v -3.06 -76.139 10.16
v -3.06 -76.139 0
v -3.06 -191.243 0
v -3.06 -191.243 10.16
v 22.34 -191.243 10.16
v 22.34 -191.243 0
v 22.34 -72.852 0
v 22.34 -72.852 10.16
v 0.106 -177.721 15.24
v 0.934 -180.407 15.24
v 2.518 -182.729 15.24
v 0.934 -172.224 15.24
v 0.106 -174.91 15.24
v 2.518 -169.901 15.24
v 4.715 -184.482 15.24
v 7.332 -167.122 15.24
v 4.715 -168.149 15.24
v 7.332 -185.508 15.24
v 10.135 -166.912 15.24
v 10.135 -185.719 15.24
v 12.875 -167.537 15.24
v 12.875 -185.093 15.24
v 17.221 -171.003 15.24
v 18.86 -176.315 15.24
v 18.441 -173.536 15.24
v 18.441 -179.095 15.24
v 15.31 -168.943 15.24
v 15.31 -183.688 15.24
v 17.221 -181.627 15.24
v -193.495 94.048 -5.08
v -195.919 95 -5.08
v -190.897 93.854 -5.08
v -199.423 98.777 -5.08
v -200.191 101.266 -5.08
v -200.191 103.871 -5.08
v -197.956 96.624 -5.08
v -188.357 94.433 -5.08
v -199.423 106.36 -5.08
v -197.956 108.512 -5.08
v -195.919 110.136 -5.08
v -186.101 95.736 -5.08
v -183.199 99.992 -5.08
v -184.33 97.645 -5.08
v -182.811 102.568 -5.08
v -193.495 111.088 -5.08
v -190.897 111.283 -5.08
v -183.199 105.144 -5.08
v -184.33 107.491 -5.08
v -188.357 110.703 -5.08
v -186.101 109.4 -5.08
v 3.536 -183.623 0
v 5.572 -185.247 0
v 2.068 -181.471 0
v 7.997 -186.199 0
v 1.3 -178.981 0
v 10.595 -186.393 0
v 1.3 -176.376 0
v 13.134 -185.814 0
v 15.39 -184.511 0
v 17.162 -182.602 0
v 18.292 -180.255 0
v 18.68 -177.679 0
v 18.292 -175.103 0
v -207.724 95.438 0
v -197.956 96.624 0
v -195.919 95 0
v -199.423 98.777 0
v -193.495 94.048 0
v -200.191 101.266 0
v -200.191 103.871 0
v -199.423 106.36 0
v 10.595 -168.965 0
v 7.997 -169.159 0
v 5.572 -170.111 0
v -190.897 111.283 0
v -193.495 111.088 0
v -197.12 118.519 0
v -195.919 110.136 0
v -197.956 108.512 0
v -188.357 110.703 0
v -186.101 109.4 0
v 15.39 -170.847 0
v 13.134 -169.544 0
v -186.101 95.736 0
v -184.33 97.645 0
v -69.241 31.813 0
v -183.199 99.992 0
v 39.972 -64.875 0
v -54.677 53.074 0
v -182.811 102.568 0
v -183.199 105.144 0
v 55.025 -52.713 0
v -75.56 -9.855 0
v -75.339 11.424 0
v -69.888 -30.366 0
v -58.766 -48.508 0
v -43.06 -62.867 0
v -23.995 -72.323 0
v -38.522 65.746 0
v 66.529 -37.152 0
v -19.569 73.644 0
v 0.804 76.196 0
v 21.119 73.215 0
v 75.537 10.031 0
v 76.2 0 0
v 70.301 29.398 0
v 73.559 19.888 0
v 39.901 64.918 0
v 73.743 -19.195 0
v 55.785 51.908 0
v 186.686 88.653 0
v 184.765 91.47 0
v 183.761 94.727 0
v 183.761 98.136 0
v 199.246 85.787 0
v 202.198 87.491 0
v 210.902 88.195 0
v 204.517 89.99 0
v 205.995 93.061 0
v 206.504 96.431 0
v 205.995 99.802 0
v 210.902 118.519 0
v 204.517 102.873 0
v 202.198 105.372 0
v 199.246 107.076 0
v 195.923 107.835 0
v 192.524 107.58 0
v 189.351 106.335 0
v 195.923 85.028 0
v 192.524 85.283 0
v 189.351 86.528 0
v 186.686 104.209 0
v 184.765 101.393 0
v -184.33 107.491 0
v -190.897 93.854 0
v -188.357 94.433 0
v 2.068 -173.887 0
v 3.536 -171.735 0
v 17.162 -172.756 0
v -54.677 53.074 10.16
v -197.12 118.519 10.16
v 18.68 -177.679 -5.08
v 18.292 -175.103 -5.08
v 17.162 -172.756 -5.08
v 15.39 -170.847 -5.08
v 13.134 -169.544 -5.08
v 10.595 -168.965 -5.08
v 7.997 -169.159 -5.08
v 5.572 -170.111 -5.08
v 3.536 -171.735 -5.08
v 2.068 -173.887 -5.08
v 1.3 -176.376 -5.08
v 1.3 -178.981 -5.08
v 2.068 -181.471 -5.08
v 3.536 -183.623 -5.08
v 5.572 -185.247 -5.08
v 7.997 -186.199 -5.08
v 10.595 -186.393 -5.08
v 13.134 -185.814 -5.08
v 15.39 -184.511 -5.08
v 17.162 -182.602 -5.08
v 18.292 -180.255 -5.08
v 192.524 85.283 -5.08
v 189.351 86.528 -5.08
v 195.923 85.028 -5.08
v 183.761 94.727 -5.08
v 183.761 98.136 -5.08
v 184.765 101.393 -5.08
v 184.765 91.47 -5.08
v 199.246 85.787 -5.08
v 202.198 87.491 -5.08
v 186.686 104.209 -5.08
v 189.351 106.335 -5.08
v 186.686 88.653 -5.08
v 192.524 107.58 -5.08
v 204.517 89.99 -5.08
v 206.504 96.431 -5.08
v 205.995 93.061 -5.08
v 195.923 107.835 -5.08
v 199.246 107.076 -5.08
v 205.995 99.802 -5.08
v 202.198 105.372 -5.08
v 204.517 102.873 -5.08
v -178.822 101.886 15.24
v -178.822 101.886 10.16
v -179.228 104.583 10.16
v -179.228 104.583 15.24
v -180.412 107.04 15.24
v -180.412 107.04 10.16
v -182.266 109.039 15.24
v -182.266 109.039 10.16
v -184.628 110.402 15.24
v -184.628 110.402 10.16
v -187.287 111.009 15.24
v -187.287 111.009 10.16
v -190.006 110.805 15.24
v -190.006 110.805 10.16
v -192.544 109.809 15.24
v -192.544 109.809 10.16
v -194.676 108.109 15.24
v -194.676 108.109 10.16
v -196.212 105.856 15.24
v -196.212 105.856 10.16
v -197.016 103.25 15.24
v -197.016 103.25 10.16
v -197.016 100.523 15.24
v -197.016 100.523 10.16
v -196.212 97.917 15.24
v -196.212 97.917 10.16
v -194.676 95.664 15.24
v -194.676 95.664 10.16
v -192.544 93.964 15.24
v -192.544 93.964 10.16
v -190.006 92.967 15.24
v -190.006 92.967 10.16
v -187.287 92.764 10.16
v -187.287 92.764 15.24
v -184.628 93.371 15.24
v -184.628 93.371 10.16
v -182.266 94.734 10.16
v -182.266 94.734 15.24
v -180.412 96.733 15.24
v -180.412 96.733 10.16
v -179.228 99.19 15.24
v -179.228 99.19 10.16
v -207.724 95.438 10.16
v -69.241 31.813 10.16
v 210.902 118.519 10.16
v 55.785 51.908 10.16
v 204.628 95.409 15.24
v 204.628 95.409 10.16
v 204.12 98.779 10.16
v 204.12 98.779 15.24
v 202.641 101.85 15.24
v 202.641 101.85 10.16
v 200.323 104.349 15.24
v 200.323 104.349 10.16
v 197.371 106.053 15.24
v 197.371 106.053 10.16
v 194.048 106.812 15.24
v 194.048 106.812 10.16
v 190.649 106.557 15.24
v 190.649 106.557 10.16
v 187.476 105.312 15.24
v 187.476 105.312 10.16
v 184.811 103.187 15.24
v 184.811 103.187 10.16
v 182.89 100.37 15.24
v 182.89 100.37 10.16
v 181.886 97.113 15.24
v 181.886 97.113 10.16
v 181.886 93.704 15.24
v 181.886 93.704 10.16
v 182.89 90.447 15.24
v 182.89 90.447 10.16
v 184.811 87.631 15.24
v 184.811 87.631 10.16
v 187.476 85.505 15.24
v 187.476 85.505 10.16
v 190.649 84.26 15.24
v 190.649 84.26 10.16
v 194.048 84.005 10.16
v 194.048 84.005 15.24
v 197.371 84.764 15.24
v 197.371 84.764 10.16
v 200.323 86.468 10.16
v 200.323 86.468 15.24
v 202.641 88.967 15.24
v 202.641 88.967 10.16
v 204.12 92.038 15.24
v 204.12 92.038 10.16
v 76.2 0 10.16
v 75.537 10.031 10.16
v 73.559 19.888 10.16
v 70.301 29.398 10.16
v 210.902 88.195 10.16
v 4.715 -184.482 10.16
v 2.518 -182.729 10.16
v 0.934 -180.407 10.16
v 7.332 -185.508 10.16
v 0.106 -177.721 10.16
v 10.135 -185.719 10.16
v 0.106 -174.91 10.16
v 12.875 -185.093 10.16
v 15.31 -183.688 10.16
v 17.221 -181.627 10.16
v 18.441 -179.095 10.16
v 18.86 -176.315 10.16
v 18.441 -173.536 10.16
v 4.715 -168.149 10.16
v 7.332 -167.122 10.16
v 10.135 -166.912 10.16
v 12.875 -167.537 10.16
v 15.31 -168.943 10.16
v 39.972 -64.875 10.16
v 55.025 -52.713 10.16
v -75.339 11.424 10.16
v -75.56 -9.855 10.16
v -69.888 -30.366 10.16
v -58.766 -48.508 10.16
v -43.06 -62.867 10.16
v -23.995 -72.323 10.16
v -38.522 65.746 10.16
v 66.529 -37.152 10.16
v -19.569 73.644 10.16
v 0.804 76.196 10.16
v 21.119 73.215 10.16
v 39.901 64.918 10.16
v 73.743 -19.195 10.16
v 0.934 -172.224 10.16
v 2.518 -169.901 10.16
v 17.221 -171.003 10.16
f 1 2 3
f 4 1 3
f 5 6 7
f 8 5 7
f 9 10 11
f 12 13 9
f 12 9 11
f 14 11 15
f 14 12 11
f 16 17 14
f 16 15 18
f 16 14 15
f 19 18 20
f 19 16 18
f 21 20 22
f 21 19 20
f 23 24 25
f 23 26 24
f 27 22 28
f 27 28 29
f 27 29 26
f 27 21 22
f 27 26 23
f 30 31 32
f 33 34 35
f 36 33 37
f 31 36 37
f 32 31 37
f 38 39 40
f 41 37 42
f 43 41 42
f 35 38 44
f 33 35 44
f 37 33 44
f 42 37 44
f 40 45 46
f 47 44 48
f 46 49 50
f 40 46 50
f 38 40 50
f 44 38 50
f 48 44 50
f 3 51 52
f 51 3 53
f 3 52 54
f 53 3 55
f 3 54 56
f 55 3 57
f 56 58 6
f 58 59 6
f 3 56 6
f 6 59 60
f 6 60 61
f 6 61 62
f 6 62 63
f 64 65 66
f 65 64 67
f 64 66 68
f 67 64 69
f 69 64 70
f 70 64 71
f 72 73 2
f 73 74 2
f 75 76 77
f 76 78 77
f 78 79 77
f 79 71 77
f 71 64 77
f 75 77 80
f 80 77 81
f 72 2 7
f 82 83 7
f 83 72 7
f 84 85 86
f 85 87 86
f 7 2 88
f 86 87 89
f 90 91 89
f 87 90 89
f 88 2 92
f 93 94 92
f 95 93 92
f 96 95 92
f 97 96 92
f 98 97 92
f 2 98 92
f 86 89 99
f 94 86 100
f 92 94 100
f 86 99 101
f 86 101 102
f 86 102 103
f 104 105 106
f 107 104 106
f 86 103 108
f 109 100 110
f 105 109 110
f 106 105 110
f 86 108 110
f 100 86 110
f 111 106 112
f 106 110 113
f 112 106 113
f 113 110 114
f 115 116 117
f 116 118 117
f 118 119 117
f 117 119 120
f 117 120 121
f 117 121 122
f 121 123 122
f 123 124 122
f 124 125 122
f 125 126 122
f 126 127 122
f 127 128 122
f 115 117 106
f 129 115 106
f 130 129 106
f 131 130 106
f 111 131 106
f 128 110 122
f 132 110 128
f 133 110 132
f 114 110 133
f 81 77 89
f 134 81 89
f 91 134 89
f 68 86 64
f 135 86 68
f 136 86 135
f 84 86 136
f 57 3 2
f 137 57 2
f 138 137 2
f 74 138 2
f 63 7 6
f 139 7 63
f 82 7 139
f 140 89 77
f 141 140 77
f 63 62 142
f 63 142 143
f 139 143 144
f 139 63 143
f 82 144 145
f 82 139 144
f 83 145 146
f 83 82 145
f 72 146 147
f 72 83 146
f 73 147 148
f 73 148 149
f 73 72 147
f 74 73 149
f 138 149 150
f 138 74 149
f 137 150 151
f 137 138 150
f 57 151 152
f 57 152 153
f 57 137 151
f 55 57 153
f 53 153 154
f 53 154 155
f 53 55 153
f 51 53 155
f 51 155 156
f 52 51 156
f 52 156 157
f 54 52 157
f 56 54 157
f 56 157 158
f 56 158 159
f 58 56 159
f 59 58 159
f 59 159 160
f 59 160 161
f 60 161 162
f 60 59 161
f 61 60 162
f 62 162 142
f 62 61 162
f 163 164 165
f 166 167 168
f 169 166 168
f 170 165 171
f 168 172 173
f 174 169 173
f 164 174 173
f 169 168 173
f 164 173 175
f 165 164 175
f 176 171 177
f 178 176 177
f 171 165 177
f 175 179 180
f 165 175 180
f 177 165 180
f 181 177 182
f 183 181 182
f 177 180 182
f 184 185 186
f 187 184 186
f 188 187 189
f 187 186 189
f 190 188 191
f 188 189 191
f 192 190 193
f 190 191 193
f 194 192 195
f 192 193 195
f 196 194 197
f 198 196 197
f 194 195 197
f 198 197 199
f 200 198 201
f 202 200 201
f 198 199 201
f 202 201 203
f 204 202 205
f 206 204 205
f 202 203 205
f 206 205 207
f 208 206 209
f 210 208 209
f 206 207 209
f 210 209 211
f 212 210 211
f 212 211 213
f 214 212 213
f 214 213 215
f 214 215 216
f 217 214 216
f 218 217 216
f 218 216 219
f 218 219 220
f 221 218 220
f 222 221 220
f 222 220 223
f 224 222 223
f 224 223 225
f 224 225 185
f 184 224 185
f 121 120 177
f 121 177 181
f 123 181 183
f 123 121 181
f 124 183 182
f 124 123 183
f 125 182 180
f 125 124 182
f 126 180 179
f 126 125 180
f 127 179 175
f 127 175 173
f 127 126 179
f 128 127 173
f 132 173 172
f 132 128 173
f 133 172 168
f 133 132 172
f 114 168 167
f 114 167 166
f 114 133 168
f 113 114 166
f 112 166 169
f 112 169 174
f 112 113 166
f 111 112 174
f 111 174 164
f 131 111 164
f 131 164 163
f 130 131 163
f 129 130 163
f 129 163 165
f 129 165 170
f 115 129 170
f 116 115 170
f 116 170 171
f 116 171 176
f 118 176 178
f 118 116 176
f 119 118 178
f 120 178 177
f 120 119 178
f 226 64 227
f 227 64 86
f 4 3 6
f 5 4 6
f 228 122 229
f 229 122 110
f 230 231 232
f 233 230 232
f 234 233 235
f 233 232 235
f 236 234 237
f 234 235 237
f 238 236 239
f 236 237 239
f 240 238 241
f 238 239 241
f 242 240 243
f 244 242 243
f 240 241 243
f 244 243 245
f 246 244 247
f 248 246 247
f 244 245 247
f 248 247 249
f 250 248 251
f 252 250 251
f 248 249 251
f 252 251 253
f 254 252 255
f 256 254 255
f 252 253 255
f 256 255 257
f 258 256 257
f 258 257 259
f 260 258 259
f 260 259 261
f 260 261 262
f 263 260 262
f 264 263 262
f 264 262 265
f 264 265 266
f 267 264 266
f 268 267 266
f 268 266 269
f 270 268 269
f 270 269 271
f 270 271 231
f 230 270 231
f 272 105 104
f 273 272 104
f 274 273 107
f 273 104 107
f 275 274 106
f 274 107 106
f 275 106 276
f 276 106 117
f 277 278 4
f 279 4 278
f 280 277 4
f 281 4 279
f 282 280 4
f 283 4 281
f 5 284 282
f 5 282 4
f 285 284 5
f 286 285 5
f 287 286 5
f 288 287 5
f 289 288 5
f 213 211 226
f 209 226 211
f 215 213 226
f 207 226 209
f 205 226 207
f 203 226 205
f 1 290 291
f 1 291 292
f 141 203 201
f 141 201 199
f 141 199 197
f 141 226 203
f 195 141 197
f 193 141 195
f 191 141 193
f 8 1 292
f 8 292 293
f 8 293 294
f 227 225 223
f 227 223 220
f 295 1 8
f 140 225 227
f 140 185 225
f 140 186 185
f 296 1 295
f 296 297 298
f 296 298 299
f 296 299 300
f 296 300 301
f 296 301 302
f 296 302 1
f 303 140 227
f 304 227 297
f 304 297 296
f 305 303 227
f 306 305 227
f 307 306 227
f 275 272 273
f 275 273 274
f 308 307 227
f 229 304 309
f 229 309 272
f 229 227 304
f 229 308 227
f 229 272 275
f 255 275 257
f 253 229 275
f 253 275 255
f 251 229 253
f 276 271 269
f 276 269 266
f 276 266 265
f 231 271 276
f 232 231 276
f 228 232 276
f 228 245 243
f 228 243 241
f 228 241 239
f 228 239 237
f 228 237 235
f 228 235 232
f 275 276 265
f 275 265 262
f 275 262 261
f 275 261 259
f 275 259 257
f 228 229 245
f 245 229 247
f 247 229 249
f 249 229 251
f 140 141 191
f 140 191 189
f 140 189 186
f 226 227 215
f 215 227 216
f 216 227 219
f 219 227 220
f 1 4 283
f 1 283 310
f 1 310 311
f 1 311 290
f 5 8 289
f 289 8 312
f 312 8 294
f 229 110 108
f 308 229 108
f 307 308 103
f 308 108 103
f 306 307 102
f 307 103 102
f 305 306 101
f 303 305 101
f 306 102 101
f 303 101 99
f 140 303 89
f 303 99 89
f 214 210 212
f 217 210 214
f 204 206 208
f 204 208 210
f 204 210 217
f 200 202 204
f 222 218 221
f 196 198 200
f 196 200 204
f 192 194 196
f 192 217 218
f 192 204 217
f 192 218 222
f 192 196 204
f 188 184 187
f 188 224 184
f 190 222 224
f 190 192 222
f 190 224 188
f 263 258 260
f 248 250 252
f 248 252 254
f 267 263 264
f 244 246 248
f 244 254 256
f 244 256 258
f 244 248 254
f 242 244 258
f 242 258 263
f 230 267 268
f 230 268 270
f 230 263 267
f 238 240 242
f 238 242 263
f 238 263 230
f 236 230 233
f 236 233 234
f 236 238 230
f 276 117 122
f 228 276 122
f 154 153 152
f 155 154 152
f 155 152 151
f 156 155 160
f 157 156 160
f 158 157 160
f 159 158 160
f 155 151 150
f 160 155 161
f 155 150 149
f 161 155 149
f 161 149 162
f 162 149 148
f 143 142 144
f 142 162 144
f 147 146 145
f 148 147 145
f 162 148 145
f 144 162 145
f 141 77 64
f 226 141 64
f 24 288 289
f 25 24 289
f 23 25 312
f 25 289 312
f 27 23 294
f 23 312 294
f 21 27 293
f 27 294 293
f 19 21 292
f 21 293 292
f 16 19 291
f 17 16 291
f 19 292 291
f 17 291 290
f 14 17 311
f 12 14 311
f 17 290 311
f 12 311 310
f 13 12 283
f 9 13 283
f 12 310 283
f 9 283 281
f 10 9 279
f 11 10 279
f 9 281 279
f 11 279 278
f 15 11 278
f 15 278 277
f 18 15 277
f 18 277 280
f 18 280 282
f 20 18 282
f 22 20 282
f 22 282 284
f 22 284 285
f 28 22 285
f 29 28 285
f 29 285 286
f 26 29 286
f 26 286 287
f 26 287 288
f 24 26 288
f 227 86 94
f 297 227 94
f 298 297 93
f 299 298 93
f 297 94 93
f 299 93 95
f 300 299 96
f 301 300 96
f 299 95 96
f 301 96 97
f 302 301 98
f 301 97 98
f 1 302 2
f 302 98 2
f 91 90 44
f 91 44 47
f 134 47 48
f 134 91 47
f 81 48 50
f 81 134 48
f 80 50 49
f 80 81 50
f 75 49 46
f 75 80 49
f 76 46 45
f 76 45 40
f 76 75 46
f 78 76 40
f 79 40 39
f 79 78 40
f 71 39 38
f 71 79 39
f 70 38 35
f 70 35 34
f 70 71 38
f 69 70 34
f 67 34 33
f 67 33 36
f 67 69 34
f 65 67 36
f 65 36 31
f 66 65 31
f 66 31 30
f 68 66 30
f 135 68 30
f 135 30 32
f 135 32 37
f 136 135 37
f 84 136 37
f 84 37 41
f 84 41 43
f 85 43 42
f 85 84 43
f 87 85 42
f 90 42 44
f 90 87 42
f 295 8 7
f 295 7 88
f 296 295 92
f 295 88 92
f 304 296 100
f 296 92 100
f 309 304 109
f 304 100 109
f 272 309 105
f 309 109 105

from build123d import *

# Parameters (mm, degrees)
F2_DEPTH = 10.16
F1_R     = 9.1481918334
F1_R_2   = 9.4297469702
F1_R_3   = 11.4352472888
F3_DEPTH = 15.24
F4_R     = 8.7387989597
F4_R_2   = 8.7387973247
F4_R_3   = 11.4352472888
F5_DEPTH = 5.08


with BuildPart() as f2:
    # F0 (on Top) → F2 (new body)
    with BuildSketch(Plane.XY):
        with BuildLine():
            ThreePointArc((22.3403535783, -72.851551816), (61.2730566508, -45.2995864072), (76.2, 0))
            ThreePointArc((76.2, 0), (74.7105977036, 14.9922176738), (70.3006144153, 29.3983607168))
            Line((70.3006144153, 29.3983607168), (22.3403535783, 9.3423048788))
            Line((22.3403535783, 9.3423048788), (22.3403535783, -72.851551816))
        make_face()
        with BuildLine():
            Line((22.3403535783, 9.3423048788), (70.3006144153, 29.3983607168))
            ThreePointArc((70.3006144153, 29.3983607168), (64.0396717964, 41.2960099309), (55.785185421, 51.9081215952))
            Line((55.785185421, 51.9081215952), (21.8996389933, 37.3568432093))
            Line((21.8996389933, 37.3568432093), (22.3403535783, 37.3568432093))
            Line((22.3403535783, 37.3568432093), (22.3403535783, 9.3423048788))
        make_face()
        with BuildLine():
            ThreePointArc((55.785185421, 51.9081215952), (64.0396717964, 41.2960099309), (70.3006144153, 29.3983607168))
            Line((70.3006144153, 29.3983607168), (210.9018432458, 88.1950821504))
            Line((210.9018432458, 88.1950821504), (210.9018432458, 118.5189898936))
            Line((210.9018432458, 118.5189898936), (55.785185421, 51.9081215952))
        make_face()
        with BuildLine():
            Line((22.3403535783, -191.2431567907), (22.3403535783, -72.851551816))
            ThreePointArc((22.3403535783, -72.851551816), (9.7794429224, -75.5698517673), (-3.0596464217, -76.1385484743))
            Line((-3.0596464217, -76.1385484743), (-3.0596464217, -191.2431567907))
            Line((-3.0596464217, -191.2431567907), (22.3403535783, -191.2431567907))
        make_face()
        with BuildLine():
            ThreePointArc((-3.0596464217, -76.1385484743), (9.7794429224, -75.5698517673), (22.3403535783, -72.851551816))
            Line((22.3403535783, -72.851551816), (22.3403535783, 9.3423048788))
            Line((22.3403535783, 9.3423048788), (0, 0))
            Line((0, 0), (-3.0596464217, 1.4057470004))
            Line((-3.0596464217, 1.4057470004), (-3.0596464217, -76.1385484743))
        make_face()
        with BuildLine():
            Line((21.8996389933, 37.3568432093), (55.785185421, 51.9081215952))
            ThreePointArc((55.785185421, 51.9081215952), (0.8041557349, 76.1957566637), (-54.6772246178, 53.0739211675))
            Line((-54.6772246178, 53.0739211675), (-3.0596464217, 29.3583522044))
            Line((-3.0596464217, 29.3583522044), (-3.0596464217, 37.3568432093))
            Line((-3.0596464217, 37.3568432093), (21.8996389933, 37.3568432093))
        make_face()
        with BuildLine():
            ThreePointArc((-69.2414887941, 31.8128312096), (-64.9633637698, -39.8271436047), (-3.0596464217, -76.1385484743))
            Line((-3.0596464217, -76.1385484743), (-3.0596464217, 1.4057470004))
            Line((-3.0596464217, 1.4057470004), (-69.2414887941, 31.8128312096))
        make_face()
        with BuildLine():
            Line((-3.0596464217, 29.3583522044), (-54.6772246178, 53.0739211675))
            ThreePointArc((-54.6772246178, 53.0739211675), (-62.8646989173, 43.0635533837), (-69.2414887941, 31.8128312096))
            Line((-69.2414887941, 31.8128312096), (-3.0596464217, 1.4057470004))
            Line((-3.0596464217, 1.4057470004), (-3.0596464217, 29.3583522044))
        make_face()
        with BuildLine():
            ThreePointArc((-69.2414887941, 31.8128312096), (-62.8646989173, 43.0635533837), (-54.6772246178, 53.0739211675))
            Line((-54.6772246178, 53.0739211675), (-197.1201893125, 118.5189898936))
            Line((-197.1201893125, 118.5189898936), (-207.7244663824, 95.4384936289))
            Line((-207.7244663824, 95.4384936289), (-69.2414887941, 31.8128312096))
        make_face()
        Polygon((0, 0), (22.3403535783, 9.3423048788), (22.3403535783, 37.3568432093), (21.8996389933, 37.3568432093), (0, 27.952605204), (-3.0596464217, 29.3583522044), (-3.0596464217, 1.4057470004), align=None)
        Polygon((0, 27.952605204), (21.8996389933, 37.3568432093), (-3.0596464217, 37.3568432093), (-3.0596464217, 29.3583522044), align=None)
    extrude(amount=F2_DEPTH)

    # F1 (on Top) → F3 (join)
    with BuildSketch(Plane.XY):
        with Locations((-187.970161438, 101.8863245845)):
            Circle(F1_R)
        with Locations((9.4301495701, -176.3151586056)):
            Circle(F1_R_2)
        with Locations((193.1931376457, 95.4085886478)):
            Circle(F1_R_3)
    extrude(amount=F3_DEPTH)

    # F4 (on Top) → F5 (join)
    with BuildSketch(Plane.XY):
        with Locations((9.941550903, -177.6788830757)):
            Circle(F4_R)
        with Locations((-191.5499567986, 102.5681942701)):
            Circle(F4_R_2)
        with Locations((195.068269968, 96.431389451)):
            Circle(F4_R_3)
    extrude(amount=-F5_DEPTH)


solid = f2.part
